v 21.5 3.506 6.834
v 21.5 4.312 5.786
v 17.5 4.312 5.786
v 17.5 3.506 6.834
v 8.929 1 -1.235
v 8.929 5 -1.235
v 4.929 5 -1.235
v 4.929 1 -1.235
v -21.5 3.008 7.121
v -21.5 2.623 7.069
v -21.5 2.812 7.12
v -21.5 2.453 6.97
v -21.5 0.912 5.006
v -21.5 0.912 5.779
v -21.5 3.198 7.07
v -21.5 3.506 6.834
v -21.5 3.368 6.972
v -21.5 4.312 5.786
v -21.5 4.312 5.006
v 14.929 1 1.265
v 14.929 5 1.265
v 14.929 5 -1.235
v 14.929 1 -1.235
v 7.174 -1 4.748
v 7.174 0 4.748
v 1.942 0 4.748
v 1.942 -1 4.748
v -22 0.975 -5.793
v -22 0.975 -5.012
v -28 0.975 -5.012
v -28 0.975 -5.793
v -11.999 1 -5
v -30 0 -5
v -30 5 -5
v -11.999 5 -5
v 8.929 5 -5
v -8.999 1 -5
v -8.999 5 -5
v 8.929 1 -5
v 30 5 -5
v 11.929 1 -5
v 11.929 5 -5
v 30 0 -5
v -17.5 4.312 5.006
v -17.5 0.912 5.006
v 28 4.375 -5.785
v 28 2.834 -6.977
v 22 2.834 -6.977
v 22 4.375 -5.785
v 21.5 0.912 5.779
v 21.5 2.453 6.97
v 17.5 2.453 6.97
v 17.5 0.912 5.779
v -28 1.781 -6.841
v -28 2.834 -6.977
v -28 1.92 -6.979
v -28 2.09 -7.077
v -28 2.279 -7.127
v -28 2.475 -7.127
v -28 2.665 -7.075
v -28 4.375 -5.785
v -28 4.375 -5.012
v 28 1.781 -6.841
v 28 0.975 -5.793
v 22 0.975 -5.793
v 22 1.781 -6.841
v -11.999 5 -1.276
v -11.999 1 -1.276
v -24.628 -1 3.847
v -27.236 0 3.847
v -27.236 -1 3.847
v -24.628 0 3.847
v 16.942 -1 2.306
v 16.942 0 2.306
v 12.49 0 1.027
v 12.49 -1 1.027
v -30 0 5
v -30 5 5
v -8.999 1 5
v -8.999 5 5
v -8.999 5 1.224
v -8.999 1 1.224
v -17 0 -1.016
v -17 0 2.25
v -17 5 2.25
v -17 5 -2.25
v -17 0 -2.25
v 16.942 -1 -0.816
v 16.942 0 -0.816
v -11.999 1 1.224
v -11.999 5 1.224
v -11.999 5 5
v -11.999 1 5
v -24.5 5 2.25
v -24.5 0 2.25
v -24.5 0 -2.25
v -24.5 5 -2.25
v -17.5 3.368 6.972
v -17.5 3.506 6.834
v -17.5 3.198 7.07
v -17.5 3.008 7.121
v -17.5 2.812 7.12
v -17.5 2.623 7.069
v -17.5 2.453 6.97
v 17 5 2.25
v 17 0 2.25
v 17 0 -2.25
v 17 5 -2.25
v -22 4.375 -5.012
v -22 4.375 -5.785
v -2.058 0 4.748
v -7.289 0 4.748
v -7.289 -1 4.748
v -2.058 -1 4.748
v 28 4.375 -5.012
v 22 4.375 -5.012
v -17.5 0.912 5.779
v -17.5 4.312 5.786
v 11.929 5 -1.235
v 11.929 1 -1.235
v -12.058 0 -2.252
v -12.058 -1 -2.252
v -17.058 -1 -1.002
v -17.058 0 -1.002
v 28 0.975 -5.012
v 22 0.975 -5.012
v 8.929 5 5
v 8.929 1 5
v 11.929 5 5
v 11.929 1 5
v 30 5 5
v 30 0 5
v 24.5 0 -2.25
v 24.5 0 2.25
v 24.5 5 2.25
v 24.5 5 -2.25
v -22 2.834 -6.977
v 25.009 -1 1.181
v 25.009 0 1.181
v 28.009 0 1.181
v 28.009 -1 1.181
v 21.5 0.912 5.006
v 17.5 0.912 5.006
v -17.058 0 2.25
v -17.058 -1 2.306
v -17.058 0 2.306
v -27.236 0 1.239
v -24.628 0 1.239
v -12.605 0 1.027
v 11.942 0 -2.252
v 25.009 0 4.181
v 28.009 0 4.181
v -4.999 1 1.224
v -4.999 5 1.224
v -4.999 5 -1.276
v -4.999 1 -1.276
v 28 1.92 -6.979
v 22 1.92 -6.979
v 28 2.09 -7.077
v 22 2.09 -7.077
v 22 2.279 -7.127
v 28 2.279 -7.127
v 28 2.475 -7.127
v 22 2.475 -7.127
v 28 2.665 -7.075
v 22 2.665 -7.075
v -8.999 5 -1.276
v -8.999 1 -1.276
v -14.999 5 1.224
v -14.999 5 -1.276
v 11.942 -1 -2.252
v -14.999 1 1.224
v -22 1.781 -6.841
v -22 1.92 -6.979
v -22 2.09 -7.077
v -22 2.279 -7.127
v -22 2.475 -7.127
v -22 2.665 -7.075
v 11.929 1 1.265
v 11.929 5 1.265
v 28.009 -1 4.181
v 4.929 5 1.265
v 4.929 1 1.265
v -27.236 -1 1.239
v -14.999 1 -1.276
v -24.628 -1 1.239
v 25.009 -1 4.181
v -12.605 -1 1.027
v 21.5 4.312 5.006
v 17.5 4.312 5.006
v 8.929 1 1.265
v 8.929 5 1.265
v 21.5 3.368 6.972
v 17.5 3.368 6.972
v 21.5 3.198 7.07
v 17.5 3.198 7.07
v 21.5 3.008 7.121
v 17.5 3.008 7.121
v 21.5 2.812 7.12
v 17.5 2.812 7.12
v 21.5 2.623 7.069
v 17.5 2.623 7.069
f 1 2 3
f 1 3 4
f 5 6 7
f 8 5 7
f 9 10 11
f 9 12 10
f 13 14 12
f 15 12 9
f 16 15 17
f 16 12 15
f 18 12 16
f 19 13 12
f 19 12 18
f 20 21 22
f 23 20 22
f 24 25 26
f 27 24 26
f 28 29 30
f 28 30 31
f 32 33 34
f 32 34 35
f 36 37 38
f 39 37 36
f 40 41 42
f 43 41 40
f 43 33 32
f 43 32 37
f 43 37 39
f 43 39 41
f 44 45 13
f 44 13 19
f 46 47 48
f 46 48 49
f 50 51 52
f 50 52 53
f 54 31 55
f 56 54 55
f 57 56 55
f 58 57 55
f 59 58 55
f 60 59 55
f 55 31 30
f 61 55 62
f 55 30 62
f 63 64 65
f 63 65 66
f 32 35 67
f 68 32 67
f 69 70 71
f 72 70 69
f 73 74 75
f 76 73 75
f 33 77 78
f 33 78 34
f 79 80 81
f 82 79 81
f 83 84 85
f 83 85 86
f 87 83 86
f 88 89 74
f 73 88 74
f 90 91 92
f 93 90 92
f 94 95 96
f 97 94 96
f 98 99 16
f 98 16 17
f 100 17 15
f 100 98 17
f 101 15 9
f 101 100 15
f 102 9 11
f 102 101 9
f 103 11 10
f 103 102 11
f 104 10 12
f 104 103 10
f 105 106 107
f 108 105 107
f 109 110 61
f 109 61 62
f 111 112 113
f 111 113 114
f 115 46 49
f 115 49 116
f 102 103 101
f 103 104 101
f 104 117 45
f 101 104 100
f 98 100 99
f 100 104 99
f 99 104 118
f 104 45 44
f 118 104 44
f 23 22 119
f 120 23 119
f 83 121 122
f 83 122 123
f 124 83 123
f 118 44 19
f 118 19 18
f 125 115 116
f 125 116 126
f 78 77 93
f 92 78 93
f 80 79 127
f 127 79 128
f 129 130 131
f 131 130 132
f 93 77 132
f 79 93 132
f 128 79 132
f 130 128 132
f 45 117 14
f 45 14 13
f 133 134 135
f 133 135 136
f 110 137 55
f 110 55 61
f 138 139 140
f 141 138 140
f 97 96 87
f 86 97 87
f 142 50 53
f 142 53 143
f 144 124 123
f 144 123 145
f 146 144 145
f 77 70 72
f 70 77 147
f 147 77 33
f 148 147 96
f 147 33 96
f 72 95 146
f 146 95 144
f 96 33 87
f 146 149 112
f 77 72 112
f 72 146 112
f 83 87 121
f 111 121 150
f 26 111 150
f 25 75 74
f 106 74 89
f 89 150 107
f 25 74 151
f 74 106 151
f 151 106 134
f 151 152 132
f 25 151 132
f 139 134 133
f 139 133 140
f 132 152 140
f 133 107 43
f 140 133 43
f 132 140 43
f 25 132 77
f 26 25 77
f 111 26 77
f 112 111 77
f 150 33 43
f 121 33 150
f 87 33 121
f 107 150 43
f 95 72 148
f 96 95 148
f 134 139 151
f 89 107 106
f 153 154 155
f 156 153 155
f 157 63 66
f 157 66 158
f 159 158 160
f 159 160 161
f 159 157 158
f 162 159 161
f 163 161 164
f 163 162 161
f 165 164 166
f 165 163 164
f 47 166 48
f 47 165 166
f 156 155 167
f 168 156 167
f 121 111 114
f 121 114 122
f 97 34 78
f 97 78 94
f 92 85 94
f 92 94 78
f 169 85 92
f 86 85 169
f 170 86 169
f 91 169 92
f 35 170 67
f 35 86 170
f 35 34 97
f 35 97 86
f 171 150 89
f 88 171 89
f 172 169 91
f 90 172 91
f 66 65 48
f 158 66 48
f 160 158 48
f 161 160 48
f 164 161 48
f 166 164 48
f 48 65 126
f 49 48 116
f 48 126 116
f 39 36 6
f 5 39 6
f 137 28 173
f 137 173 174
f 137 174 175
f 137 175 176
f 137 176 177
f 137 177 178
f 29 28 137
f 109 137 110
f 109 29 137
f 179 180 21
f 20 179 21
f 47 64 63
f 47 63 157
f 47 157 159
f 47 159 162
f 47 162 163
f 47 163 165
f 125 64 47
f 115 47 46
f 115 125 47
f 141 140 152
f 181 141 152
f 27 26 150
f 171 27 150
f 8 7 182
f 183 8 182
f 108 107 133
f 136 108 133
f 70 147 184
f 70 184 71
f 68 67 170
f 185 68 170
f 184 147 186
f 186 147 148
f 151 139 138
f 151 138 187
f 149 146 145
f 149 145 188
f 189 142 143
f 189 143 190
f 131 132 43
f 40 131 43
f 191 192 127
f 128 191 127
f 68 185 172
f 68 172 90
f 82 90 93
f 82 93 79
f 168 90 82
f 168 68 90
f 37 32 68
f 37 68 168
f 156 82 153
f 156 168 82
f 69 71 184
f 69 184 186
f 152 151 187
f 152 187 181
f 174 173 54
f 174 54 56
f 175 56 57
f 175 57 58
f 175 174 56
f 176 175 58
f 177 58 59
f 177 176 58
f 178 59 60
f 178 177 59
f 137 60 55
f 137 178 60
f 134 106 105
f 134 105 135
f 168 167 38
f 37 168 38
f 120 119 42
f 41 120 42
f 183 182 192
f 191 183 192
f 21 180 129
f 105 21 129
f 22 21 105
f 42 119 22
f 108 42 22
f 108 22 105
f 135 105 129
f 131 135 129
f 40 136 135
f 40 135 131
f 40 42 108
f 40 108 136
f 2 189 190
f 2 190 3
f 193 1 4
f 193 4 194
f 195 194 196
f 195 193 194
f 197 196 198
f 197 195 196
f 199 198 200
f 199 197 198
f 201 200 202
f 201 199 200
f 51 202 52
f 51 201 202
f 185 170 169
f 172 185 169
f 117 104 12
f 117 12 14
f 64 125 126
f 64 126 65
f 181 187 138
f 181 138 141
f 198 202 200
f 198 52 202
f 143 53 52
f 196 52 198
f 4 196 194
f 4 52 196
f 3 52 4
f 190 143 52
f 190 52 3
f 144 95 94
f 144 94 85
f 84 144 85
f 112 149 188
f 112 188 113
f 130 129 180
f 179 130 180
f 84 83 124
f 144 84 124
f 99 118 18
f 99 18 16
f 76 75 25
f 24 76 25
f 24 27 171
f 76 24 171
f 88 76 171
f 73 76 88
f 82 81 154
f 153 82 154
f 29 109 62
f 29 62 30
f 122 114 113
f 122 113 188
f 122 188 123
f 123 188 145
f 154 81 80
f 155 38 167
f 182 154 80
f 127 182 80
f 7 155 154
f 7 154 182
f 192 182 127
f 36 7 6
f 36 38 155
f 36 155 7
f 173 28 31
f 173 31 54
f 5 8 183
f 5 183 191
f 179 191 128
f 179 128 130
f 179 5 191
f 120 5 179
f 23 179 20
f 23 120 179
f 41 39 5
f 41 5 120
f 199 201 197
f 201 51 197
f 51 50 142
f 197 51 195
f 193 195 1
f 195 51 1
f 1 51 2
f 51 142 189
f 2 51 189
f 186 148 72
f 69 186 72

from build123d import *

# Parameters (mm, degrees)
SKETCH2_W             = 60
SKETCH2_H             = 10
SKETCH2_W_2           = 7.5
SKETCH2_H_2           = 4.5
BOSS_EXTRUDE2_DEPTH   = 5
BOSS_EXTRUDE5_DEPTH   = 60
BOSS_EXTRUDE5_2_DEPTH = 60
SKETCH7_W             = 2
SKETCH7_H             = 5
SKETCH7_W_2           = 44
CUT_EXTRUDE1_DEPTH    = 13
SKETCH8_W             = 8.5
SKETCH8_H             = 5
SKETCH8_W_2           = 35
CUT_EXTRUDE2_DEPTH    = 13
CUT_EXTRUDE3_DEPTH    = 4
CUT_EXTRUDE4_DEPTH    = 4
SKETCH11_W            = 2.607558909
SKETCH11_H            = 2.607558909
SKETCH11_W_2          = 3
SKETCH11_H_2          = 3
BOSS_EXTRUDE6_DEPTH   = 1


with BuildPart() as part:
    # Sketch2 → Boss-Extrude2 (new body)
    with BuildSketch(Plane(origin=(0, 0, 0), x_dir=(1, 0, 0), z_dir=(0, 1, 0))):
        Rectangle(SKETCH2_W, SKETCH2_H)
        with Locations((-20.75, 0)):
            Rectangle(SKETCH2_W_2, SKETCH2_H_2, mode=Mode.SUBTRACT)
        with Locations((20.75, 0)):
            Rectangle(SKETCH2_W_2, SKETCH2_H_2, mode=Mode.SUBTRACT)
    extrude(amount=BOSS_EXTRUDE2_DEPTH)

    # Sketch9 → Cut-Extrude3 (cut)
    with BuildSketch(Plane(origin=(0, 5, 0), x_dir=(1, 0, 0), z_dir=(0, 1, 0))):
        Polygon((11.928979033, 5.223704971), (8.928979033, 5.223704971), (8.928979033, 1.234800062), (4.928979033, 1.234800062), (4.928979033, -1.265199938), (8.928979033, -1.265199938), (8.928979033, -5.015199938), (11.928979033, -5.015199938), (11.928979033, -1.265199938), (14.928979033, -1.265199938), (14.928979033, 1.234800062), (11.928979033, 1.234800062), align=None)
    extrude(amount=-CUT_EXTRUDE3_DEPTH, mode=Mode.SUBTRACT)

    # Sketch10 → Cut-Extrude4 (cut)
    with BuildSketch(Plane(origin=(0, 5, 0), x_dir=(1, 0, 0), z_dir=(0, 1, 0))):
        Polygon((-8.998853084, 5.543958906), (-11.998853084, 5.543958906), (-11.998853084, 1.276052018), (-14.998853084, 1.276052018), (-14.998853084, -1.223947982), (-11.998853084, -1.223947982), (-11.998853084, -5.457260258), (-8.998853084, -5.457260258), (-8.998853084, -1.223947982), (-4.998853084, -1.223947982), (-4.998853084, 1.276052018), (-8.998853084, 1.276052018), align=None)
    extrude(amount=-CUT_EXTRUDE4_DEPTH, mode=Mode.SUBTRACT)

    # Sketch11 → Boss-Extrude6 (add)
    with BuildSketch(Plane.XZ):
        Polygon((-17.057761592, 2.305867808), (-12.605307979, 1.026631968), (-7.28914587, 4.747975962), (-2.057761592, 4.747975962), (-12.057761592, -2.252024038), (-17.057761592, -1.002024038), align=None)
        with Locations((-25.931804893, 2.543124907)):
            Rectangle(SKETCH11_W, SKETCH11_H)
        Polygon((11.942238408, -2.252024038), (16.942238408, -0.815500601), (16.942238408, 2.305867808), (12.489784794, 1.026631968), (7.173622685, 4.747975962), (1.942238408, 4.747975962), align=None)
        with Locations((26.509292135, 2.680922235)):
            Rectangle(SKETCH11_W_2, SKETCH11_H_2)
    extrude(amount=BOSS_EXTRUDE6_DEPTH)


with BuildPart() as body_2:
    # Sketch6 → Boss-Extrude5 (new body)
    with BuildSketch(Plane(origin=(30, 0, 0), x_dir=(0, 0, -1), z_dir=(1, 0, 0))):
        with BuildLine():
            Line((-5.005702164, 0.91177929), (-5.005702164, 4.311779386))
            Line((-5.005702164, 4.311779386), (-5.786219743, 4.311779386))
            Line((-5.786219743, 4.311779386), (-6.833939918, 3.506406203))
            ThreePointArc((-6.833939918, 3.506406203), (-7.120662065, 3.008016247), (-6.970231619, 2.45306326))
            Line((-6.970231619, 2.45306326), (-5.778742936, 0.91177929))
            Line((-5.778742936, 0.91177929), (-5.005702164, 0.91177929))
        make_face()
    extrude(amount=-BOSS_EXTRUDE5_DEPTH)

    # Sketch8 → Cut-Extrude2 (cut)
    with BuildSketch(Plane.XY.offset(5)):
        with Locations((25.75, 2.5)):
            Rectangle(SKETCH8_W, SKETCH8_H)
        with Locations((0, 2.5)):
            Rectangle(SKETCH8_W_2, SKETCH8_H)
        with Locations((-25.75, 2.5)):
            Rectangle(SKETCH8_W, SKETCH8_H)
    extrude(amount=CUT_EXTRUDE2_DEPTH, mode=Mode.SUBTRACT)


with BuildPart() as body_3:
    # Sketch6 → Boss-Extrude5 2 (new body)
    with BuildSketch(Plane(origin=(30, 0, 0), x_dir=(0, 0, -1), z_dir=(1, 0, 0))):
        with BuildLine():
            Line((5.785355249, 4.375491674), (5.012314477, 4.375491674))
            Line((5.012314477, 4.375491674), (5.012314477, 0.975491579))
            Line((5.012314477, 0.975491579), (5.792832055, 0.975491579))
            Line((5.792832055, 0.975491579), (6.840552231, 1.780864761))
            ThreePointArc((6.840552231, 1.780864761), (7.127274377, 2.279254717), (6.976843932, 2.834207704))
            Line((6.976843932, 2.834207704), (5.785355249, 4.375491674))
        make_face()
    extrude(amount=-BOSS_EXTRUDE5_2_DEPTH)

    # Sketch7 → Cut-Extrude1 (cut)
    with BuildSketch(Plane(origin=(0, 0, -5), x_dir=(-1, 0, 0), z_dir=(0, 0, -1))):
        with Locations((-29, 2.5)):
            Rectangle(SKETCH7_W, SKETCH7_H)
        with Locations((0, 2.5)):
            Rectangle(SKETCH7_W_2, SKETCH7_H)
        with Locations((29, 2.5)):
            Rectangle(SKETCH7_W, SKETCH7_H)
    extrude(amount=CUT_EXTRUDE1_DEPTH, mode=Mode.SUBTRACT)


with BuildPart() as cut_extrude1_piece_1:
    # of the separate pieces the step leaves, piece 1, a body of its own (cut_extrude1_pieces)
    add(body_3.part.solids().sort_by_distance((28, 4.375491674, -5.785355249))[0])


with BuildPart() as cut_extrude1_piece_2:
    # of the separate pieces the step leaves, piece 2, a body of its own (cut_extrude1_pieces)
    add(body_3.part.solids().sort_by_distance((-22, 4.375491674, -5.785355249))[0])


with BuildPart() as cut_extrude2_piece_1:
    # of the separate pieces the step leaves, piece 1, a body of its own (cut_extrude2_pieces)
    add(body_2.part.solids().sort_by_distance((-17.5, 0.91177929, 5.778742936))[0])


with BuildPart() as cut_extrude2_piece_2:
    # of the separate pieces the step leaves, piece 2, a body of its own (cut_extrude2_pieces)
    add(body_2.part.solids().sort_by_distance((21.5, 0.91177929, 5.778742936))[0])


solid = Compound([part.part, cut_extrude1_piece_1.part, cut_extrude1_piece_2.part, cut_extrude2_piece_1.part, cut_extrude2_piece_2.part])
